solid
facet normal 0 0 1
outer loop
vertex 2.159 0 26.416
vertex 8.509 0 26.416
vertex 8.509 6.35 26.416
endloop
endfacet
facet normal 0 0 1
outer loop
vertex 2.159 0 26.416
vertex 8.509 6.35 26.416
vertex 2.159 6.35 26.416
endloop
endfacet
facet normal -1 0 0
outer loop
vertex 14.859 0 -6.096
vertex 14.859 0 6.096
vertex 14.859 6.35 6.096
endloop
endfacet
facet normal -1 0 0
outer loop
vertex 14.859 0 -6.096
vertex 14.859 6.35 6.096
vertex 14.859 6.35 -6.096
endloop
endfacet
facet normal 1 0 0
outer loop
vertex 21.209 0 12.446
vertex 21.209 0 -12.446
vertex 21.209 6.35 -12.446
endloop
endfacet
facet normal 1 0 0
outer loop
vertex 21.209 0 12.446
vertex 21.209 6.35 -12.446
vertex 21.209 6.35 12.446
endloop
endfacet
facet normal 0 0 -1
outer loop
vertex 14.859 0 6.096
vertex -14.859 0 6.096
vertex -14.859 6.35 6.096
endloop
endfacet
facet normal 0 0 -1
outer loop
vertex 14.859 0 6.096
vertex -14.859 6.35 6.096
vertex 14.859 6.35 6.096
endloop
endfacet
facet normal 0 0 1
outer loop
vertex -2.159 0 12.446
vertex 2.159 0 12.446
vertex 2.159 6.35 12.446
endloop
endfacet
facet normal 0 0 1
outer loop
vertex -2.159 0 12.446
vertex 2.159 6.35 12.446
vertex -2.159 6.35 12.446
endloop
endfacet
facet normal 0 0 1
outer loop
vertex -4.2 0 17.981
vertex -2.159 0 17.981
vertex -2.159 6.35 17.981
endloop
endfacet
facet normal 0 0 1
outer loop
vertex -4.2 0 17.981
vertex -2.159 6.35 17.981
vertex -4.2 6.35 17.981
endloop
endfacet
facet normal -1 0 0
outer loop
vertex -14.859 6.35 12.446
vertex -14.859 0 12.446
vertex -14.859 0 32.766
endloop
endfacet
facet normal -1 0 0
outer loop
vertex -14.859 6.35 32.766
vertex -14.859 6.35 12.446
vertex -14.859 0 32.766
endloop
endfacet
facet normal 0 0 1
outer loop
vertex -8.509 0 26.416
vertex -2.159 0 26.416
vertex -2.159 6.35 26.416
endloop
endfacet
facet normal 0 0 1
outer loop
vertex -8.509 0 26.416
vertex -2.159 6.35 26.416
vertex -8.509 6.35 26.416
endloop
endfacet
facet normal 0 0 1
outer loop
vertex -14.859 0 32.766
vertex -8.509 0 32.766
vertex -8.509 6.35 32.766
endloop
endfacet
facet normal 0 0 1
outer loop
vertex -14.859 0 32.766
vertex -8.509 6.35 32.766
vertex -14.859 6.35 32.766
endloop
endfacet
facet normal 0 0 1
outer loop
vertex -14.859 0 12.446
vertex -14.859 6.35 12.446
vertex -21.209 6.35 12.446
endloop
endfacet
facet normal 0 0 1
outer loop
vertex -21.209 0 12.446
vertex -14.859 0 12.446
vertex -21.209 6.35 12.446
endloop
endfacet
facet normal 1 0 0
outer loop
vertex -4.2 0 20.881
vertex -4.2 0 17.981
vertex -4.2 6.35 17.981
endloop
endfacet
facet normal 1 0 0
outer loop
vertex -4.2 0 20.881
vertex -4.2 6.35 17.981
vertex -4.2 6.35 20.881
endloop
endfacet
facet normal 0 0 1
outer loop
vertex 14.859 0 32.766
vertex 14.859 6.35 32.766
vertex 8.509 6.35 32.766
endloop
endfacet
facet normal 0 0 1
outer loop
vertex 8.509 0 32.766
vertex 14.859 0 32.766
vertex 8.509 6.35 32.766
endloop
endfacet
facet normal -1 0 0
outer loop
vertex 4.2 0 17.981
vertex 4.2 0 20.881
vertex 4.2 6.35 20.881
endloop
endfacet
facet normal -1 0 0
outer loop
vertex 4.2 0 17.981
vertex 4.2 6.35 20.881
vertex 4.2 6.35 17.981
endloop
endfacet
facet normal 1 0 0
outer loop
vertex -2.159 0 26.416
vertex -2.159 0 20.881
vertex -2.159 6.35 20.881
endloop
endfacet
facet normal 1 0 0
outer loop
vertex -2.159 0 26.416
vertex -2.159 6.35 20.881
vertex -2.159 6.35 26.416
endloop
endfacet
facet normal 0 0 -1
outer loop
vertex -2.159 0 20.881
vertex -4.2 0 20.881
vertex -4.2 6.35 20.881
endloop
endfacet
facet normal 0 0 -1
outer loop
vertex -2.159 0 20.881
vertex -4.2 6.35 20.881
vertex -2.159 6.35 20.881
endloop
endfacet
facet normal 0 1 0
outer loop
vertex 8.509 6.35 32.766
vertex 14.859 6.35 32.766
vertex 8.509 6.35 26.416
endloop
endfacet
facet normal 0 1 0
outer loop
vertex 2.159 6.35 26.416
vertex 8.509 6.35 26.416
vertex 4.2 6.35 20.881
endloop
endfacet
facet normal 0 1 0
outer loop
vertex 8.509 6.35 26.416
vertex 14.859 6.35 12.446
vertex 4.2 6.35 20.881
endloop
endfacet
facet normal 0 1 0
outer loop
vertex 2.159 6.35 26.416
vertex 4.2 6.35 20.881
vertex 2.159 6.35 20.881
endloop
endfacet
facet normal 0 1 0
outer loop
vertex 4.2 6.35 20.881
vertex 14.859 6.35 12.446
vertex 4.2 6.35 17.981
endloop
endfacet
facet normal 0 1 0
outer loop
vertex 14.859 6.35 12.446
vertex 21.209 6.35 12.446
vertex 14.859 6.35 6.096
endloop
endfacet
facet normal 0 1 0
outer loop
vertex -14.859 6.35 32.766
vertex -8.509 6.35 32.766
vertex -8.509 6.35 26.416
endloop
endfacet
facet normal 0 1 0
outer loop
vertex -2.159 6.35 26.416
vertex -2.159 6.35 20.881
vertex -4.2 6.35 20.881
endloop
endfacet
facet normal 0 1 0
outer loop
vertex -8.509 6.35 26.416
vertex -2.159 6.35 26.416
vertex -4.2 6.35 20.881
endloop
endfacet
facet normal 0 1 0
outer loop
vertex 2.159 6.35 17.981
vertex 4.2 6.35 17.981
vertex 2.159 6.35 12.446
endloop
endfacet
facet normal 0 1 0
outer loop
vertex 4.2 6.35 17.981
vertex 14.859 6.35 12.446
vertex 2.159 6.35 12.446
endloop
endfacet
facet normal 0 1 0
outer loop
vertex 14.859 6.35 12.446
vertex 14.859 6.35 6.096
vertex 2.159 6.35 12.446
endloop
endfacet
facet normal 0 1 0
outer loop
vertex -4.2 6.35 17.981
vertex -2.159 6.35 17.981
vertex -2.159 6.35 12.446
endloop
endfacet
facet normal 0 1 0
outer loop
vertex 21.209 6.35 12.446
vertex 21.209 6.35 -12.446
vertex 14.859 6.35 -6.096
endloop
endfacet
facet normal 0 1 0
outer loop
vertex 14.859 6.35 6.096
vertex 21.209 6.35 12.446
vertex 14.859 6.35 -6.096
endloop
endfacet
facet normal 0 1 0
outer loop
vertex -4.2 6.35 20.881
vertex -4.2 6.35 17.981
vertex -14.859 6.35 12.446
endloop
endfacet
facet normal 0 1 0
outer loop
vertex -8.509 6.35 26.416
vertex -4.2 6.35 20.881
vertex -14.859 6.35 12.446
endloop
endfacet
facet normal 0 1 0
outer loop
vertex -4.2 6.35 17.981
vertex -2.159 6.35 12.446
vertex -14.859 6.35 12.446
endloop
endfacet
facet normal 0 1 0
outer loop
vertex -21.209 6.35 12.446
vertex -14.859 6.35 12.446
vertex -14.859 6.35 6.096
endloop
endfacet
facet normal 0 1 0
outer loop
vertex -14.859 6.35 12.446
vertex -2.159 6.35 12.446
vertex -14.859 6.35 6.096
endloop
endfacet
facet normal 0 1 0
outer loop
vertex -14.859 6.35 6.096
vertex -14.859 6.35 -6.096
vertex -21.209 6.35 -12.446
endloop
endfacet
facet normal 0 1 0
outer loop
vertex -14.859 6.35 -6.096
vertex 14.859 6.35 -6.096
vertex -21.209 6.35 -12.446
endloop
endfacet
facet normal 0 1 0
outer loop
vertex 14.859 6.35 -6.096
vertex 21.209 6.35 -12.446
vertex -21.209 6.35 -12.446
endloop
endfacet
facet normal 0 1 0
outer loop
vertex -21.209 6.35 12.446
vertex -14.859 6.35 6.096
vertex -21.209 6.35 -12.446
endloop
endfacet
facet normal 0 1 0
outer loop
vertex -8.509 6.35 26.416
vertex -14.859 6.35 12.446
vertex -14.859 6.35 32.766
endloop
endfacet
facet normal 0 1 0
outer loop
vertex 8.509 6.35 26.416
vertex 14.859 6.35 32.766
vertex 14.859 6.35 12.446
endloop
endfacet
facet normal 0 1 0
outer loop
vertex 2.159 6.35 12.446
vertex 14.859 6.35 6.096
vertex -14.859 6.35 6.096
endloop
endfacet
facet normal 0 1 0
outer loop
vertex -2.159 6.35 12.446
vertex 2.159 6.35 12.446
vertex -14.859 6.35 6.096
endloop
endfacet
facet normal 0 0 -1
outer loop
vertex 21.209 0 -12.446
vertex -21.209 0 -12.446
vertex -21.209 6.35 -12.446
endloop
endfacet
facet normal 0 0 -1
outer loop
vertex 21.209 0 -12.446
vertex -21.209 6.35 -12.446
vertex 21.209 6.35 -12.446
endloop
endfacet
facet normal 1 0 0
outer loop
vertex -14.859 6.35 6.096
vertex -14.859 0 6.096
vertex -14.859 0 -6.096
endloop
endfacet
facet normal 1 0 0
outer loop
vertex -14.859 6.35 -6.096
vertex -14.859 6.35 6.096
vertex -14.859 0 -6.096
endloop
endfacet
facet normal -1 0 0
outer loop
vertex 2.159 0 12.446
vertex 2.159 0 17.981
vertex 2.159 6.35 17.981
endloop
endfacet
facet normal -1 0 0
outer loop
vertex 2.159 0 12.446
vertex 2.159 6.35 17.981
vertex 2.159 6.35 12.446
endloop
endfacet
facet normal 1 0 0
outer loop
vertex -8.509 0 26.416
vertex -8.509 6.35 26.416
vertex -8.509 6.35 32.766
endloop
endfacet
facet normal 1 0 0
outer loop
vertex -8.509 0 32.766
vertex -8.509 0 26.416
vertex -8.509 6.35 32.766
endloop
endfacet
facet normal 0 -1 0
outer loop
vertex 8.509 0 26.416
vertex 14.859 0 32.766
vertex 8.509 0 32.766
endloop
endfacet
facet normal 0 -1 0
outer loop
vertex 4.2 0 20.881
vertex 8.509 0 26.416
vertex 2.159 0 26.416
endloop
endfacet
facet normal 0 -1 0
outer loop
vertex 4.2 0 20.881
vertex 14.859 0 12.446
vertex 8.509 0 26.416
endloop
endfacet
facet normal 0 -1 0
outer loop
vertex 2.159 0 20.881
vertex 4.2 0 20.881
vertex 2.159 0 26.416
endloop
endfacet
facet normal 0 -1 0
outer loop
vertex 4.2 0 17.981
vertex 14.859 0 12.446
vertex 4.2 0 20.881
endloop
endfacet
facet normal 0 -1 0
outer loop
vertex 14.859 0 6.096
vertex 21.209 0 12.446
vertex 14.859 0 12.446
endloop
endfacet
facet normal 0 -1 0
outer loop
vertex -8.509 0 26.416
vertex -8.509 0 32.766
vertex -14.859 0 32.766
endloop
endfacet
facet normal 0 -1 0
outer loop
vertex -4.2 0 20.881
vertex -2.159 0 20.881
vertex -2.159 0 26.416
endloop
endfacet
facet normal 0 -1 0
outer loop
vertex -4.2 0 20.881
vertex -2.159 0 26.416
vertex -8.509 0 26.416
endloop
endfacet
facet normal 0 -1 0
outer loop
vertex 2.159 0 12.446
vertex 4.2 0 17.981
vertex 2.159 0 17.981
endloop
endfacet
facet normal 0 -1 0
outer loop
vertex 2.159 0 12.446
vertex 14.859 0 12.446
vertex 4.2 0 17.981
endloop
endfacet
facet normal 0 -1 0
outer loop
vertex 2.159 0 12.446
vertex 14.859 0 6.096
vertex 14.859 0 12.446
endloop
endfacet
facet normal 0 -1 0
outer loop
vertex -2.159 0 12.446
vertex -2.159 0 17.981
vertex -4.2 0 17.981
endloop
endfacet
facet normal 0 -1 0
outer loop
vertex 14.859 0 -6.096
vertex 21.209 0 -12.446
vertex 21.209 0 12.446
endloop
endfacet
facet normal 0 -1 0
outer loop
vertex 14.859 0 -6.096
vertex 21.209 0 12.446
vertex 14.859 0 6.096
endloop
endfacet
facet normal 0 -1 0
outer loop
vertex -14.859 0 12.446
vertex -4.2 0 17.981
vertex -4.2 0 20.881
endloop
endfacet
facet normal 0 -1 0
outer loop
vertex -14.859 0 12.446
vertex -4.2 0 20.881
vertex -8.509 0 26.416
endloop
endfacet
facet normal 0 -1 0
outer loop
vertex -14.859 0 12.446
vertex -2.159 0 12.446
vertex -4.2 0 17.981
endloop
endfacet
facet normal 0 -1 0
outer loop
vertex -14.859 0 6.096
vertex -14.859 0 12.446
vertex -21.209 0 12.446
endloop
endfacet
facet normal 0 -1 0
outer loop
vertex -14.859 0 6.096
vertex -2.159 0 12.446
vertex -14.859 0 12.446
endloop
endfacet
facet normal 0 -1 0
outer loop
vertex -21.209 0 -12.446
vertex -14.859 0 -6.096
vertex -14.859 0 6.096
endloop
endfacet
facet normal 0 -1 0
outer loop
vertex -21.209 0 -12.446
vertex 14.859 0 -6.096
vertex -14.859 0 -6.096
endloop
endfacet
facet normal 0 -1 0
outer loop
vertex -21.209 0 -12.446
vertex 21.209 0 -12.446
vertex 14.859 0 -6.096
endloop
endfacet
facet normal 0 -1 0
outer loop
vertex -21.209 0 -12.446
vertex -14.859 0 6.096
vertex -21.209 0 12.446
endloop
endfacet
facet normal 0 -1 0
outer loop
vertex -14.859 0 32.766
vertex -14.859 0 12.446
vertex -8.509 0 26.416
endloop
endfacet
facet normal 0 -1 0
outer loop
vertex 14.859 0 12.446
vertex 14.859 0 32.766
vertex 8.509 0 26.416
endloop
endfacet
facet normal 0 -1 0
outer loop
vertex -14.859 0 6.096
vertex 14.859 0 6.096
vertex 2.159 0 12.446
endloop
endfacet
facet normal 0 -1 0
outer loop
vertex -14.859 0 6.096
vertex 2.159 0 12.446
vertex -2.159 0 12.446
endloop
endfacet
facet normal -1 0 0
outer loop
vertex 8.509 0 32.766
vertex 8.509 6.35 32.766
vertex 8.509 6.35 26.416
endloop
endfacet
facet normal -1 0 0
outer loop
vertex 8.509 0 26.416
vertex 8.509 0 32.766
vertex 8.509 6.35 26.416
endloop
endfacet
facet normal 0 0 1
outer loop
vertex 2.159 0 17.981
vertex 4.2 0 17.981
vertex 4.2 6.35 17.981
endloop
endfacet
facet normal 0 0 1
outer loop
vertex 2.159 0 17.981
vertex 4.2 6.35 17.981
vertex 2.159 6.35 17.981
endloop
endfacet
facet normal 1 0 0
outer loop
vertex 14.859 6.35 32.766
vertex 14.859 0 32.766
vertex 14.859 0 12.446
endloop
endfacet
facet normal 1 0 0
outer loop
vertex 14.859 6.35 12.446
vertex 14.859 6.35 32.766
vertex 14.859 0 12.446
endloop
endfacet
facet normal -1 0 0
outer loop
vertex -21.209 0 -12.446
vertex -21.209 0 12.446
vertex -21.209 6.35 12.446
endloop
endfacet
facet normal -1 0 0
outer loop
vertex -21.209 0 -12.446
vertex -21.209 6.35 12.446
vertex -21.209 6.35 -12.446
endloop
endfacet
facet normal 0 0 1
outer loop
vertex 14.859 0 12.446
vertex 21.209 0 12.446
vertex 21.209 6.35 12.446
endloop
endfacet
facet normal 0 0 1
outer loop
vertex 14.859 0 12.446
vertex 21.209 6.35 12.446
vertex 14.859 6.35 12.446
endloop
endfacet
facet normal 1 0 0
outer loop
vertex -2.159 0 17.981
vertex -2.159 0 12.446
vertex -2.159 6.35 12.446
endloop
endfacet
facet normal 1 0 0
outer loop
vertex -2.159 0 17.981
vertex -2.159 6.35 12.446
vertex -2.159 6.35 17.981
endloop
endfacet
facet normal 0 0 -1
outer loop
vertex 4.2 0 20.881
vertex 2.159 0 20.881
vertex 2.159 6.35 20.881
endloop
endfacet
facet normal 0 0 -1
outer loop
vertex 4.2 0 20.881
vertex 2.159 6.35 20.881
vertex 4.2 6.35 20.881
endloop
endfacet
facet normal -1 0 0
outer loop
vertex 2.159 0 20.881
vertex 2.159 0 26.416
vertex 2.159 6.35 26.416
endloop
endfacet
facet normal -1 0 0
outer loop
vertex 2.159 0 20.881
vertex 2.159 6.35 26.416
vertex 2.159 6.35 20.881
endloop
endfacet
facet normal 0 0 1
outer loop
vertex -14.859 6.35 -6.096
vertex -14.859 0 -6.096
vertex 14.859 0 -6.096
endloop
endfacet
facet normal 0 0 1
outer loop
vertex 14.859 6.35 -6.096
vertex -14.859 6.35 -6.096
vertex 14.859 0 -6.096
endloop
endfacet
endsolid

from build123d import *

# Parameters (mm, degrees)
SKETCH1_W           = 29.718
SKETCH1_H           = 12.192
BOSS_EXTRUDE1_DEPTH = 6.35


with BuildPart() as part:
    # Sketch1 → Boss-Extrude1 (new body)
    with BuildSketch(Plane(origin=(0, 0, 0), x_dir=(1, 0, 0), z_dir=(0, 1, 0))):
        Polygon((-21.209, 12.446), (-21.209, -12.446), (-14.859, -12.446), (-14.859, -26.416), (-14.859, -32.766), (-8.509, -32.766), (-8.509, -26.416), (-2.159, -26.416), (-2.159, -20.881000021), (-4.199999982, -20.881000021), (-4.199999982, -17.980999979), (-2.159, -17.980999979), (-2.159, -12.446), (2.159, -12.446), (2.159, -17.980999979), (4.199999982, -17.980999979), (4.199999982, -20.881000021), (2.159, -20.881000021), (2.159, -26.416), (8.509, -26.416), (8.509, -32.766), (14.859, -32.766), (14.859, -26.416), (14.859, -12.446), (21.209, -12.446), (21.209, 12.446), align=None)
        Rectangle(SKETCH1_W, SKETCH1_H, mode=Mode.SUBTRACT)
    extrude(amount=BOSS_EXTRUDE1_DEPTH)


solid = part.part
